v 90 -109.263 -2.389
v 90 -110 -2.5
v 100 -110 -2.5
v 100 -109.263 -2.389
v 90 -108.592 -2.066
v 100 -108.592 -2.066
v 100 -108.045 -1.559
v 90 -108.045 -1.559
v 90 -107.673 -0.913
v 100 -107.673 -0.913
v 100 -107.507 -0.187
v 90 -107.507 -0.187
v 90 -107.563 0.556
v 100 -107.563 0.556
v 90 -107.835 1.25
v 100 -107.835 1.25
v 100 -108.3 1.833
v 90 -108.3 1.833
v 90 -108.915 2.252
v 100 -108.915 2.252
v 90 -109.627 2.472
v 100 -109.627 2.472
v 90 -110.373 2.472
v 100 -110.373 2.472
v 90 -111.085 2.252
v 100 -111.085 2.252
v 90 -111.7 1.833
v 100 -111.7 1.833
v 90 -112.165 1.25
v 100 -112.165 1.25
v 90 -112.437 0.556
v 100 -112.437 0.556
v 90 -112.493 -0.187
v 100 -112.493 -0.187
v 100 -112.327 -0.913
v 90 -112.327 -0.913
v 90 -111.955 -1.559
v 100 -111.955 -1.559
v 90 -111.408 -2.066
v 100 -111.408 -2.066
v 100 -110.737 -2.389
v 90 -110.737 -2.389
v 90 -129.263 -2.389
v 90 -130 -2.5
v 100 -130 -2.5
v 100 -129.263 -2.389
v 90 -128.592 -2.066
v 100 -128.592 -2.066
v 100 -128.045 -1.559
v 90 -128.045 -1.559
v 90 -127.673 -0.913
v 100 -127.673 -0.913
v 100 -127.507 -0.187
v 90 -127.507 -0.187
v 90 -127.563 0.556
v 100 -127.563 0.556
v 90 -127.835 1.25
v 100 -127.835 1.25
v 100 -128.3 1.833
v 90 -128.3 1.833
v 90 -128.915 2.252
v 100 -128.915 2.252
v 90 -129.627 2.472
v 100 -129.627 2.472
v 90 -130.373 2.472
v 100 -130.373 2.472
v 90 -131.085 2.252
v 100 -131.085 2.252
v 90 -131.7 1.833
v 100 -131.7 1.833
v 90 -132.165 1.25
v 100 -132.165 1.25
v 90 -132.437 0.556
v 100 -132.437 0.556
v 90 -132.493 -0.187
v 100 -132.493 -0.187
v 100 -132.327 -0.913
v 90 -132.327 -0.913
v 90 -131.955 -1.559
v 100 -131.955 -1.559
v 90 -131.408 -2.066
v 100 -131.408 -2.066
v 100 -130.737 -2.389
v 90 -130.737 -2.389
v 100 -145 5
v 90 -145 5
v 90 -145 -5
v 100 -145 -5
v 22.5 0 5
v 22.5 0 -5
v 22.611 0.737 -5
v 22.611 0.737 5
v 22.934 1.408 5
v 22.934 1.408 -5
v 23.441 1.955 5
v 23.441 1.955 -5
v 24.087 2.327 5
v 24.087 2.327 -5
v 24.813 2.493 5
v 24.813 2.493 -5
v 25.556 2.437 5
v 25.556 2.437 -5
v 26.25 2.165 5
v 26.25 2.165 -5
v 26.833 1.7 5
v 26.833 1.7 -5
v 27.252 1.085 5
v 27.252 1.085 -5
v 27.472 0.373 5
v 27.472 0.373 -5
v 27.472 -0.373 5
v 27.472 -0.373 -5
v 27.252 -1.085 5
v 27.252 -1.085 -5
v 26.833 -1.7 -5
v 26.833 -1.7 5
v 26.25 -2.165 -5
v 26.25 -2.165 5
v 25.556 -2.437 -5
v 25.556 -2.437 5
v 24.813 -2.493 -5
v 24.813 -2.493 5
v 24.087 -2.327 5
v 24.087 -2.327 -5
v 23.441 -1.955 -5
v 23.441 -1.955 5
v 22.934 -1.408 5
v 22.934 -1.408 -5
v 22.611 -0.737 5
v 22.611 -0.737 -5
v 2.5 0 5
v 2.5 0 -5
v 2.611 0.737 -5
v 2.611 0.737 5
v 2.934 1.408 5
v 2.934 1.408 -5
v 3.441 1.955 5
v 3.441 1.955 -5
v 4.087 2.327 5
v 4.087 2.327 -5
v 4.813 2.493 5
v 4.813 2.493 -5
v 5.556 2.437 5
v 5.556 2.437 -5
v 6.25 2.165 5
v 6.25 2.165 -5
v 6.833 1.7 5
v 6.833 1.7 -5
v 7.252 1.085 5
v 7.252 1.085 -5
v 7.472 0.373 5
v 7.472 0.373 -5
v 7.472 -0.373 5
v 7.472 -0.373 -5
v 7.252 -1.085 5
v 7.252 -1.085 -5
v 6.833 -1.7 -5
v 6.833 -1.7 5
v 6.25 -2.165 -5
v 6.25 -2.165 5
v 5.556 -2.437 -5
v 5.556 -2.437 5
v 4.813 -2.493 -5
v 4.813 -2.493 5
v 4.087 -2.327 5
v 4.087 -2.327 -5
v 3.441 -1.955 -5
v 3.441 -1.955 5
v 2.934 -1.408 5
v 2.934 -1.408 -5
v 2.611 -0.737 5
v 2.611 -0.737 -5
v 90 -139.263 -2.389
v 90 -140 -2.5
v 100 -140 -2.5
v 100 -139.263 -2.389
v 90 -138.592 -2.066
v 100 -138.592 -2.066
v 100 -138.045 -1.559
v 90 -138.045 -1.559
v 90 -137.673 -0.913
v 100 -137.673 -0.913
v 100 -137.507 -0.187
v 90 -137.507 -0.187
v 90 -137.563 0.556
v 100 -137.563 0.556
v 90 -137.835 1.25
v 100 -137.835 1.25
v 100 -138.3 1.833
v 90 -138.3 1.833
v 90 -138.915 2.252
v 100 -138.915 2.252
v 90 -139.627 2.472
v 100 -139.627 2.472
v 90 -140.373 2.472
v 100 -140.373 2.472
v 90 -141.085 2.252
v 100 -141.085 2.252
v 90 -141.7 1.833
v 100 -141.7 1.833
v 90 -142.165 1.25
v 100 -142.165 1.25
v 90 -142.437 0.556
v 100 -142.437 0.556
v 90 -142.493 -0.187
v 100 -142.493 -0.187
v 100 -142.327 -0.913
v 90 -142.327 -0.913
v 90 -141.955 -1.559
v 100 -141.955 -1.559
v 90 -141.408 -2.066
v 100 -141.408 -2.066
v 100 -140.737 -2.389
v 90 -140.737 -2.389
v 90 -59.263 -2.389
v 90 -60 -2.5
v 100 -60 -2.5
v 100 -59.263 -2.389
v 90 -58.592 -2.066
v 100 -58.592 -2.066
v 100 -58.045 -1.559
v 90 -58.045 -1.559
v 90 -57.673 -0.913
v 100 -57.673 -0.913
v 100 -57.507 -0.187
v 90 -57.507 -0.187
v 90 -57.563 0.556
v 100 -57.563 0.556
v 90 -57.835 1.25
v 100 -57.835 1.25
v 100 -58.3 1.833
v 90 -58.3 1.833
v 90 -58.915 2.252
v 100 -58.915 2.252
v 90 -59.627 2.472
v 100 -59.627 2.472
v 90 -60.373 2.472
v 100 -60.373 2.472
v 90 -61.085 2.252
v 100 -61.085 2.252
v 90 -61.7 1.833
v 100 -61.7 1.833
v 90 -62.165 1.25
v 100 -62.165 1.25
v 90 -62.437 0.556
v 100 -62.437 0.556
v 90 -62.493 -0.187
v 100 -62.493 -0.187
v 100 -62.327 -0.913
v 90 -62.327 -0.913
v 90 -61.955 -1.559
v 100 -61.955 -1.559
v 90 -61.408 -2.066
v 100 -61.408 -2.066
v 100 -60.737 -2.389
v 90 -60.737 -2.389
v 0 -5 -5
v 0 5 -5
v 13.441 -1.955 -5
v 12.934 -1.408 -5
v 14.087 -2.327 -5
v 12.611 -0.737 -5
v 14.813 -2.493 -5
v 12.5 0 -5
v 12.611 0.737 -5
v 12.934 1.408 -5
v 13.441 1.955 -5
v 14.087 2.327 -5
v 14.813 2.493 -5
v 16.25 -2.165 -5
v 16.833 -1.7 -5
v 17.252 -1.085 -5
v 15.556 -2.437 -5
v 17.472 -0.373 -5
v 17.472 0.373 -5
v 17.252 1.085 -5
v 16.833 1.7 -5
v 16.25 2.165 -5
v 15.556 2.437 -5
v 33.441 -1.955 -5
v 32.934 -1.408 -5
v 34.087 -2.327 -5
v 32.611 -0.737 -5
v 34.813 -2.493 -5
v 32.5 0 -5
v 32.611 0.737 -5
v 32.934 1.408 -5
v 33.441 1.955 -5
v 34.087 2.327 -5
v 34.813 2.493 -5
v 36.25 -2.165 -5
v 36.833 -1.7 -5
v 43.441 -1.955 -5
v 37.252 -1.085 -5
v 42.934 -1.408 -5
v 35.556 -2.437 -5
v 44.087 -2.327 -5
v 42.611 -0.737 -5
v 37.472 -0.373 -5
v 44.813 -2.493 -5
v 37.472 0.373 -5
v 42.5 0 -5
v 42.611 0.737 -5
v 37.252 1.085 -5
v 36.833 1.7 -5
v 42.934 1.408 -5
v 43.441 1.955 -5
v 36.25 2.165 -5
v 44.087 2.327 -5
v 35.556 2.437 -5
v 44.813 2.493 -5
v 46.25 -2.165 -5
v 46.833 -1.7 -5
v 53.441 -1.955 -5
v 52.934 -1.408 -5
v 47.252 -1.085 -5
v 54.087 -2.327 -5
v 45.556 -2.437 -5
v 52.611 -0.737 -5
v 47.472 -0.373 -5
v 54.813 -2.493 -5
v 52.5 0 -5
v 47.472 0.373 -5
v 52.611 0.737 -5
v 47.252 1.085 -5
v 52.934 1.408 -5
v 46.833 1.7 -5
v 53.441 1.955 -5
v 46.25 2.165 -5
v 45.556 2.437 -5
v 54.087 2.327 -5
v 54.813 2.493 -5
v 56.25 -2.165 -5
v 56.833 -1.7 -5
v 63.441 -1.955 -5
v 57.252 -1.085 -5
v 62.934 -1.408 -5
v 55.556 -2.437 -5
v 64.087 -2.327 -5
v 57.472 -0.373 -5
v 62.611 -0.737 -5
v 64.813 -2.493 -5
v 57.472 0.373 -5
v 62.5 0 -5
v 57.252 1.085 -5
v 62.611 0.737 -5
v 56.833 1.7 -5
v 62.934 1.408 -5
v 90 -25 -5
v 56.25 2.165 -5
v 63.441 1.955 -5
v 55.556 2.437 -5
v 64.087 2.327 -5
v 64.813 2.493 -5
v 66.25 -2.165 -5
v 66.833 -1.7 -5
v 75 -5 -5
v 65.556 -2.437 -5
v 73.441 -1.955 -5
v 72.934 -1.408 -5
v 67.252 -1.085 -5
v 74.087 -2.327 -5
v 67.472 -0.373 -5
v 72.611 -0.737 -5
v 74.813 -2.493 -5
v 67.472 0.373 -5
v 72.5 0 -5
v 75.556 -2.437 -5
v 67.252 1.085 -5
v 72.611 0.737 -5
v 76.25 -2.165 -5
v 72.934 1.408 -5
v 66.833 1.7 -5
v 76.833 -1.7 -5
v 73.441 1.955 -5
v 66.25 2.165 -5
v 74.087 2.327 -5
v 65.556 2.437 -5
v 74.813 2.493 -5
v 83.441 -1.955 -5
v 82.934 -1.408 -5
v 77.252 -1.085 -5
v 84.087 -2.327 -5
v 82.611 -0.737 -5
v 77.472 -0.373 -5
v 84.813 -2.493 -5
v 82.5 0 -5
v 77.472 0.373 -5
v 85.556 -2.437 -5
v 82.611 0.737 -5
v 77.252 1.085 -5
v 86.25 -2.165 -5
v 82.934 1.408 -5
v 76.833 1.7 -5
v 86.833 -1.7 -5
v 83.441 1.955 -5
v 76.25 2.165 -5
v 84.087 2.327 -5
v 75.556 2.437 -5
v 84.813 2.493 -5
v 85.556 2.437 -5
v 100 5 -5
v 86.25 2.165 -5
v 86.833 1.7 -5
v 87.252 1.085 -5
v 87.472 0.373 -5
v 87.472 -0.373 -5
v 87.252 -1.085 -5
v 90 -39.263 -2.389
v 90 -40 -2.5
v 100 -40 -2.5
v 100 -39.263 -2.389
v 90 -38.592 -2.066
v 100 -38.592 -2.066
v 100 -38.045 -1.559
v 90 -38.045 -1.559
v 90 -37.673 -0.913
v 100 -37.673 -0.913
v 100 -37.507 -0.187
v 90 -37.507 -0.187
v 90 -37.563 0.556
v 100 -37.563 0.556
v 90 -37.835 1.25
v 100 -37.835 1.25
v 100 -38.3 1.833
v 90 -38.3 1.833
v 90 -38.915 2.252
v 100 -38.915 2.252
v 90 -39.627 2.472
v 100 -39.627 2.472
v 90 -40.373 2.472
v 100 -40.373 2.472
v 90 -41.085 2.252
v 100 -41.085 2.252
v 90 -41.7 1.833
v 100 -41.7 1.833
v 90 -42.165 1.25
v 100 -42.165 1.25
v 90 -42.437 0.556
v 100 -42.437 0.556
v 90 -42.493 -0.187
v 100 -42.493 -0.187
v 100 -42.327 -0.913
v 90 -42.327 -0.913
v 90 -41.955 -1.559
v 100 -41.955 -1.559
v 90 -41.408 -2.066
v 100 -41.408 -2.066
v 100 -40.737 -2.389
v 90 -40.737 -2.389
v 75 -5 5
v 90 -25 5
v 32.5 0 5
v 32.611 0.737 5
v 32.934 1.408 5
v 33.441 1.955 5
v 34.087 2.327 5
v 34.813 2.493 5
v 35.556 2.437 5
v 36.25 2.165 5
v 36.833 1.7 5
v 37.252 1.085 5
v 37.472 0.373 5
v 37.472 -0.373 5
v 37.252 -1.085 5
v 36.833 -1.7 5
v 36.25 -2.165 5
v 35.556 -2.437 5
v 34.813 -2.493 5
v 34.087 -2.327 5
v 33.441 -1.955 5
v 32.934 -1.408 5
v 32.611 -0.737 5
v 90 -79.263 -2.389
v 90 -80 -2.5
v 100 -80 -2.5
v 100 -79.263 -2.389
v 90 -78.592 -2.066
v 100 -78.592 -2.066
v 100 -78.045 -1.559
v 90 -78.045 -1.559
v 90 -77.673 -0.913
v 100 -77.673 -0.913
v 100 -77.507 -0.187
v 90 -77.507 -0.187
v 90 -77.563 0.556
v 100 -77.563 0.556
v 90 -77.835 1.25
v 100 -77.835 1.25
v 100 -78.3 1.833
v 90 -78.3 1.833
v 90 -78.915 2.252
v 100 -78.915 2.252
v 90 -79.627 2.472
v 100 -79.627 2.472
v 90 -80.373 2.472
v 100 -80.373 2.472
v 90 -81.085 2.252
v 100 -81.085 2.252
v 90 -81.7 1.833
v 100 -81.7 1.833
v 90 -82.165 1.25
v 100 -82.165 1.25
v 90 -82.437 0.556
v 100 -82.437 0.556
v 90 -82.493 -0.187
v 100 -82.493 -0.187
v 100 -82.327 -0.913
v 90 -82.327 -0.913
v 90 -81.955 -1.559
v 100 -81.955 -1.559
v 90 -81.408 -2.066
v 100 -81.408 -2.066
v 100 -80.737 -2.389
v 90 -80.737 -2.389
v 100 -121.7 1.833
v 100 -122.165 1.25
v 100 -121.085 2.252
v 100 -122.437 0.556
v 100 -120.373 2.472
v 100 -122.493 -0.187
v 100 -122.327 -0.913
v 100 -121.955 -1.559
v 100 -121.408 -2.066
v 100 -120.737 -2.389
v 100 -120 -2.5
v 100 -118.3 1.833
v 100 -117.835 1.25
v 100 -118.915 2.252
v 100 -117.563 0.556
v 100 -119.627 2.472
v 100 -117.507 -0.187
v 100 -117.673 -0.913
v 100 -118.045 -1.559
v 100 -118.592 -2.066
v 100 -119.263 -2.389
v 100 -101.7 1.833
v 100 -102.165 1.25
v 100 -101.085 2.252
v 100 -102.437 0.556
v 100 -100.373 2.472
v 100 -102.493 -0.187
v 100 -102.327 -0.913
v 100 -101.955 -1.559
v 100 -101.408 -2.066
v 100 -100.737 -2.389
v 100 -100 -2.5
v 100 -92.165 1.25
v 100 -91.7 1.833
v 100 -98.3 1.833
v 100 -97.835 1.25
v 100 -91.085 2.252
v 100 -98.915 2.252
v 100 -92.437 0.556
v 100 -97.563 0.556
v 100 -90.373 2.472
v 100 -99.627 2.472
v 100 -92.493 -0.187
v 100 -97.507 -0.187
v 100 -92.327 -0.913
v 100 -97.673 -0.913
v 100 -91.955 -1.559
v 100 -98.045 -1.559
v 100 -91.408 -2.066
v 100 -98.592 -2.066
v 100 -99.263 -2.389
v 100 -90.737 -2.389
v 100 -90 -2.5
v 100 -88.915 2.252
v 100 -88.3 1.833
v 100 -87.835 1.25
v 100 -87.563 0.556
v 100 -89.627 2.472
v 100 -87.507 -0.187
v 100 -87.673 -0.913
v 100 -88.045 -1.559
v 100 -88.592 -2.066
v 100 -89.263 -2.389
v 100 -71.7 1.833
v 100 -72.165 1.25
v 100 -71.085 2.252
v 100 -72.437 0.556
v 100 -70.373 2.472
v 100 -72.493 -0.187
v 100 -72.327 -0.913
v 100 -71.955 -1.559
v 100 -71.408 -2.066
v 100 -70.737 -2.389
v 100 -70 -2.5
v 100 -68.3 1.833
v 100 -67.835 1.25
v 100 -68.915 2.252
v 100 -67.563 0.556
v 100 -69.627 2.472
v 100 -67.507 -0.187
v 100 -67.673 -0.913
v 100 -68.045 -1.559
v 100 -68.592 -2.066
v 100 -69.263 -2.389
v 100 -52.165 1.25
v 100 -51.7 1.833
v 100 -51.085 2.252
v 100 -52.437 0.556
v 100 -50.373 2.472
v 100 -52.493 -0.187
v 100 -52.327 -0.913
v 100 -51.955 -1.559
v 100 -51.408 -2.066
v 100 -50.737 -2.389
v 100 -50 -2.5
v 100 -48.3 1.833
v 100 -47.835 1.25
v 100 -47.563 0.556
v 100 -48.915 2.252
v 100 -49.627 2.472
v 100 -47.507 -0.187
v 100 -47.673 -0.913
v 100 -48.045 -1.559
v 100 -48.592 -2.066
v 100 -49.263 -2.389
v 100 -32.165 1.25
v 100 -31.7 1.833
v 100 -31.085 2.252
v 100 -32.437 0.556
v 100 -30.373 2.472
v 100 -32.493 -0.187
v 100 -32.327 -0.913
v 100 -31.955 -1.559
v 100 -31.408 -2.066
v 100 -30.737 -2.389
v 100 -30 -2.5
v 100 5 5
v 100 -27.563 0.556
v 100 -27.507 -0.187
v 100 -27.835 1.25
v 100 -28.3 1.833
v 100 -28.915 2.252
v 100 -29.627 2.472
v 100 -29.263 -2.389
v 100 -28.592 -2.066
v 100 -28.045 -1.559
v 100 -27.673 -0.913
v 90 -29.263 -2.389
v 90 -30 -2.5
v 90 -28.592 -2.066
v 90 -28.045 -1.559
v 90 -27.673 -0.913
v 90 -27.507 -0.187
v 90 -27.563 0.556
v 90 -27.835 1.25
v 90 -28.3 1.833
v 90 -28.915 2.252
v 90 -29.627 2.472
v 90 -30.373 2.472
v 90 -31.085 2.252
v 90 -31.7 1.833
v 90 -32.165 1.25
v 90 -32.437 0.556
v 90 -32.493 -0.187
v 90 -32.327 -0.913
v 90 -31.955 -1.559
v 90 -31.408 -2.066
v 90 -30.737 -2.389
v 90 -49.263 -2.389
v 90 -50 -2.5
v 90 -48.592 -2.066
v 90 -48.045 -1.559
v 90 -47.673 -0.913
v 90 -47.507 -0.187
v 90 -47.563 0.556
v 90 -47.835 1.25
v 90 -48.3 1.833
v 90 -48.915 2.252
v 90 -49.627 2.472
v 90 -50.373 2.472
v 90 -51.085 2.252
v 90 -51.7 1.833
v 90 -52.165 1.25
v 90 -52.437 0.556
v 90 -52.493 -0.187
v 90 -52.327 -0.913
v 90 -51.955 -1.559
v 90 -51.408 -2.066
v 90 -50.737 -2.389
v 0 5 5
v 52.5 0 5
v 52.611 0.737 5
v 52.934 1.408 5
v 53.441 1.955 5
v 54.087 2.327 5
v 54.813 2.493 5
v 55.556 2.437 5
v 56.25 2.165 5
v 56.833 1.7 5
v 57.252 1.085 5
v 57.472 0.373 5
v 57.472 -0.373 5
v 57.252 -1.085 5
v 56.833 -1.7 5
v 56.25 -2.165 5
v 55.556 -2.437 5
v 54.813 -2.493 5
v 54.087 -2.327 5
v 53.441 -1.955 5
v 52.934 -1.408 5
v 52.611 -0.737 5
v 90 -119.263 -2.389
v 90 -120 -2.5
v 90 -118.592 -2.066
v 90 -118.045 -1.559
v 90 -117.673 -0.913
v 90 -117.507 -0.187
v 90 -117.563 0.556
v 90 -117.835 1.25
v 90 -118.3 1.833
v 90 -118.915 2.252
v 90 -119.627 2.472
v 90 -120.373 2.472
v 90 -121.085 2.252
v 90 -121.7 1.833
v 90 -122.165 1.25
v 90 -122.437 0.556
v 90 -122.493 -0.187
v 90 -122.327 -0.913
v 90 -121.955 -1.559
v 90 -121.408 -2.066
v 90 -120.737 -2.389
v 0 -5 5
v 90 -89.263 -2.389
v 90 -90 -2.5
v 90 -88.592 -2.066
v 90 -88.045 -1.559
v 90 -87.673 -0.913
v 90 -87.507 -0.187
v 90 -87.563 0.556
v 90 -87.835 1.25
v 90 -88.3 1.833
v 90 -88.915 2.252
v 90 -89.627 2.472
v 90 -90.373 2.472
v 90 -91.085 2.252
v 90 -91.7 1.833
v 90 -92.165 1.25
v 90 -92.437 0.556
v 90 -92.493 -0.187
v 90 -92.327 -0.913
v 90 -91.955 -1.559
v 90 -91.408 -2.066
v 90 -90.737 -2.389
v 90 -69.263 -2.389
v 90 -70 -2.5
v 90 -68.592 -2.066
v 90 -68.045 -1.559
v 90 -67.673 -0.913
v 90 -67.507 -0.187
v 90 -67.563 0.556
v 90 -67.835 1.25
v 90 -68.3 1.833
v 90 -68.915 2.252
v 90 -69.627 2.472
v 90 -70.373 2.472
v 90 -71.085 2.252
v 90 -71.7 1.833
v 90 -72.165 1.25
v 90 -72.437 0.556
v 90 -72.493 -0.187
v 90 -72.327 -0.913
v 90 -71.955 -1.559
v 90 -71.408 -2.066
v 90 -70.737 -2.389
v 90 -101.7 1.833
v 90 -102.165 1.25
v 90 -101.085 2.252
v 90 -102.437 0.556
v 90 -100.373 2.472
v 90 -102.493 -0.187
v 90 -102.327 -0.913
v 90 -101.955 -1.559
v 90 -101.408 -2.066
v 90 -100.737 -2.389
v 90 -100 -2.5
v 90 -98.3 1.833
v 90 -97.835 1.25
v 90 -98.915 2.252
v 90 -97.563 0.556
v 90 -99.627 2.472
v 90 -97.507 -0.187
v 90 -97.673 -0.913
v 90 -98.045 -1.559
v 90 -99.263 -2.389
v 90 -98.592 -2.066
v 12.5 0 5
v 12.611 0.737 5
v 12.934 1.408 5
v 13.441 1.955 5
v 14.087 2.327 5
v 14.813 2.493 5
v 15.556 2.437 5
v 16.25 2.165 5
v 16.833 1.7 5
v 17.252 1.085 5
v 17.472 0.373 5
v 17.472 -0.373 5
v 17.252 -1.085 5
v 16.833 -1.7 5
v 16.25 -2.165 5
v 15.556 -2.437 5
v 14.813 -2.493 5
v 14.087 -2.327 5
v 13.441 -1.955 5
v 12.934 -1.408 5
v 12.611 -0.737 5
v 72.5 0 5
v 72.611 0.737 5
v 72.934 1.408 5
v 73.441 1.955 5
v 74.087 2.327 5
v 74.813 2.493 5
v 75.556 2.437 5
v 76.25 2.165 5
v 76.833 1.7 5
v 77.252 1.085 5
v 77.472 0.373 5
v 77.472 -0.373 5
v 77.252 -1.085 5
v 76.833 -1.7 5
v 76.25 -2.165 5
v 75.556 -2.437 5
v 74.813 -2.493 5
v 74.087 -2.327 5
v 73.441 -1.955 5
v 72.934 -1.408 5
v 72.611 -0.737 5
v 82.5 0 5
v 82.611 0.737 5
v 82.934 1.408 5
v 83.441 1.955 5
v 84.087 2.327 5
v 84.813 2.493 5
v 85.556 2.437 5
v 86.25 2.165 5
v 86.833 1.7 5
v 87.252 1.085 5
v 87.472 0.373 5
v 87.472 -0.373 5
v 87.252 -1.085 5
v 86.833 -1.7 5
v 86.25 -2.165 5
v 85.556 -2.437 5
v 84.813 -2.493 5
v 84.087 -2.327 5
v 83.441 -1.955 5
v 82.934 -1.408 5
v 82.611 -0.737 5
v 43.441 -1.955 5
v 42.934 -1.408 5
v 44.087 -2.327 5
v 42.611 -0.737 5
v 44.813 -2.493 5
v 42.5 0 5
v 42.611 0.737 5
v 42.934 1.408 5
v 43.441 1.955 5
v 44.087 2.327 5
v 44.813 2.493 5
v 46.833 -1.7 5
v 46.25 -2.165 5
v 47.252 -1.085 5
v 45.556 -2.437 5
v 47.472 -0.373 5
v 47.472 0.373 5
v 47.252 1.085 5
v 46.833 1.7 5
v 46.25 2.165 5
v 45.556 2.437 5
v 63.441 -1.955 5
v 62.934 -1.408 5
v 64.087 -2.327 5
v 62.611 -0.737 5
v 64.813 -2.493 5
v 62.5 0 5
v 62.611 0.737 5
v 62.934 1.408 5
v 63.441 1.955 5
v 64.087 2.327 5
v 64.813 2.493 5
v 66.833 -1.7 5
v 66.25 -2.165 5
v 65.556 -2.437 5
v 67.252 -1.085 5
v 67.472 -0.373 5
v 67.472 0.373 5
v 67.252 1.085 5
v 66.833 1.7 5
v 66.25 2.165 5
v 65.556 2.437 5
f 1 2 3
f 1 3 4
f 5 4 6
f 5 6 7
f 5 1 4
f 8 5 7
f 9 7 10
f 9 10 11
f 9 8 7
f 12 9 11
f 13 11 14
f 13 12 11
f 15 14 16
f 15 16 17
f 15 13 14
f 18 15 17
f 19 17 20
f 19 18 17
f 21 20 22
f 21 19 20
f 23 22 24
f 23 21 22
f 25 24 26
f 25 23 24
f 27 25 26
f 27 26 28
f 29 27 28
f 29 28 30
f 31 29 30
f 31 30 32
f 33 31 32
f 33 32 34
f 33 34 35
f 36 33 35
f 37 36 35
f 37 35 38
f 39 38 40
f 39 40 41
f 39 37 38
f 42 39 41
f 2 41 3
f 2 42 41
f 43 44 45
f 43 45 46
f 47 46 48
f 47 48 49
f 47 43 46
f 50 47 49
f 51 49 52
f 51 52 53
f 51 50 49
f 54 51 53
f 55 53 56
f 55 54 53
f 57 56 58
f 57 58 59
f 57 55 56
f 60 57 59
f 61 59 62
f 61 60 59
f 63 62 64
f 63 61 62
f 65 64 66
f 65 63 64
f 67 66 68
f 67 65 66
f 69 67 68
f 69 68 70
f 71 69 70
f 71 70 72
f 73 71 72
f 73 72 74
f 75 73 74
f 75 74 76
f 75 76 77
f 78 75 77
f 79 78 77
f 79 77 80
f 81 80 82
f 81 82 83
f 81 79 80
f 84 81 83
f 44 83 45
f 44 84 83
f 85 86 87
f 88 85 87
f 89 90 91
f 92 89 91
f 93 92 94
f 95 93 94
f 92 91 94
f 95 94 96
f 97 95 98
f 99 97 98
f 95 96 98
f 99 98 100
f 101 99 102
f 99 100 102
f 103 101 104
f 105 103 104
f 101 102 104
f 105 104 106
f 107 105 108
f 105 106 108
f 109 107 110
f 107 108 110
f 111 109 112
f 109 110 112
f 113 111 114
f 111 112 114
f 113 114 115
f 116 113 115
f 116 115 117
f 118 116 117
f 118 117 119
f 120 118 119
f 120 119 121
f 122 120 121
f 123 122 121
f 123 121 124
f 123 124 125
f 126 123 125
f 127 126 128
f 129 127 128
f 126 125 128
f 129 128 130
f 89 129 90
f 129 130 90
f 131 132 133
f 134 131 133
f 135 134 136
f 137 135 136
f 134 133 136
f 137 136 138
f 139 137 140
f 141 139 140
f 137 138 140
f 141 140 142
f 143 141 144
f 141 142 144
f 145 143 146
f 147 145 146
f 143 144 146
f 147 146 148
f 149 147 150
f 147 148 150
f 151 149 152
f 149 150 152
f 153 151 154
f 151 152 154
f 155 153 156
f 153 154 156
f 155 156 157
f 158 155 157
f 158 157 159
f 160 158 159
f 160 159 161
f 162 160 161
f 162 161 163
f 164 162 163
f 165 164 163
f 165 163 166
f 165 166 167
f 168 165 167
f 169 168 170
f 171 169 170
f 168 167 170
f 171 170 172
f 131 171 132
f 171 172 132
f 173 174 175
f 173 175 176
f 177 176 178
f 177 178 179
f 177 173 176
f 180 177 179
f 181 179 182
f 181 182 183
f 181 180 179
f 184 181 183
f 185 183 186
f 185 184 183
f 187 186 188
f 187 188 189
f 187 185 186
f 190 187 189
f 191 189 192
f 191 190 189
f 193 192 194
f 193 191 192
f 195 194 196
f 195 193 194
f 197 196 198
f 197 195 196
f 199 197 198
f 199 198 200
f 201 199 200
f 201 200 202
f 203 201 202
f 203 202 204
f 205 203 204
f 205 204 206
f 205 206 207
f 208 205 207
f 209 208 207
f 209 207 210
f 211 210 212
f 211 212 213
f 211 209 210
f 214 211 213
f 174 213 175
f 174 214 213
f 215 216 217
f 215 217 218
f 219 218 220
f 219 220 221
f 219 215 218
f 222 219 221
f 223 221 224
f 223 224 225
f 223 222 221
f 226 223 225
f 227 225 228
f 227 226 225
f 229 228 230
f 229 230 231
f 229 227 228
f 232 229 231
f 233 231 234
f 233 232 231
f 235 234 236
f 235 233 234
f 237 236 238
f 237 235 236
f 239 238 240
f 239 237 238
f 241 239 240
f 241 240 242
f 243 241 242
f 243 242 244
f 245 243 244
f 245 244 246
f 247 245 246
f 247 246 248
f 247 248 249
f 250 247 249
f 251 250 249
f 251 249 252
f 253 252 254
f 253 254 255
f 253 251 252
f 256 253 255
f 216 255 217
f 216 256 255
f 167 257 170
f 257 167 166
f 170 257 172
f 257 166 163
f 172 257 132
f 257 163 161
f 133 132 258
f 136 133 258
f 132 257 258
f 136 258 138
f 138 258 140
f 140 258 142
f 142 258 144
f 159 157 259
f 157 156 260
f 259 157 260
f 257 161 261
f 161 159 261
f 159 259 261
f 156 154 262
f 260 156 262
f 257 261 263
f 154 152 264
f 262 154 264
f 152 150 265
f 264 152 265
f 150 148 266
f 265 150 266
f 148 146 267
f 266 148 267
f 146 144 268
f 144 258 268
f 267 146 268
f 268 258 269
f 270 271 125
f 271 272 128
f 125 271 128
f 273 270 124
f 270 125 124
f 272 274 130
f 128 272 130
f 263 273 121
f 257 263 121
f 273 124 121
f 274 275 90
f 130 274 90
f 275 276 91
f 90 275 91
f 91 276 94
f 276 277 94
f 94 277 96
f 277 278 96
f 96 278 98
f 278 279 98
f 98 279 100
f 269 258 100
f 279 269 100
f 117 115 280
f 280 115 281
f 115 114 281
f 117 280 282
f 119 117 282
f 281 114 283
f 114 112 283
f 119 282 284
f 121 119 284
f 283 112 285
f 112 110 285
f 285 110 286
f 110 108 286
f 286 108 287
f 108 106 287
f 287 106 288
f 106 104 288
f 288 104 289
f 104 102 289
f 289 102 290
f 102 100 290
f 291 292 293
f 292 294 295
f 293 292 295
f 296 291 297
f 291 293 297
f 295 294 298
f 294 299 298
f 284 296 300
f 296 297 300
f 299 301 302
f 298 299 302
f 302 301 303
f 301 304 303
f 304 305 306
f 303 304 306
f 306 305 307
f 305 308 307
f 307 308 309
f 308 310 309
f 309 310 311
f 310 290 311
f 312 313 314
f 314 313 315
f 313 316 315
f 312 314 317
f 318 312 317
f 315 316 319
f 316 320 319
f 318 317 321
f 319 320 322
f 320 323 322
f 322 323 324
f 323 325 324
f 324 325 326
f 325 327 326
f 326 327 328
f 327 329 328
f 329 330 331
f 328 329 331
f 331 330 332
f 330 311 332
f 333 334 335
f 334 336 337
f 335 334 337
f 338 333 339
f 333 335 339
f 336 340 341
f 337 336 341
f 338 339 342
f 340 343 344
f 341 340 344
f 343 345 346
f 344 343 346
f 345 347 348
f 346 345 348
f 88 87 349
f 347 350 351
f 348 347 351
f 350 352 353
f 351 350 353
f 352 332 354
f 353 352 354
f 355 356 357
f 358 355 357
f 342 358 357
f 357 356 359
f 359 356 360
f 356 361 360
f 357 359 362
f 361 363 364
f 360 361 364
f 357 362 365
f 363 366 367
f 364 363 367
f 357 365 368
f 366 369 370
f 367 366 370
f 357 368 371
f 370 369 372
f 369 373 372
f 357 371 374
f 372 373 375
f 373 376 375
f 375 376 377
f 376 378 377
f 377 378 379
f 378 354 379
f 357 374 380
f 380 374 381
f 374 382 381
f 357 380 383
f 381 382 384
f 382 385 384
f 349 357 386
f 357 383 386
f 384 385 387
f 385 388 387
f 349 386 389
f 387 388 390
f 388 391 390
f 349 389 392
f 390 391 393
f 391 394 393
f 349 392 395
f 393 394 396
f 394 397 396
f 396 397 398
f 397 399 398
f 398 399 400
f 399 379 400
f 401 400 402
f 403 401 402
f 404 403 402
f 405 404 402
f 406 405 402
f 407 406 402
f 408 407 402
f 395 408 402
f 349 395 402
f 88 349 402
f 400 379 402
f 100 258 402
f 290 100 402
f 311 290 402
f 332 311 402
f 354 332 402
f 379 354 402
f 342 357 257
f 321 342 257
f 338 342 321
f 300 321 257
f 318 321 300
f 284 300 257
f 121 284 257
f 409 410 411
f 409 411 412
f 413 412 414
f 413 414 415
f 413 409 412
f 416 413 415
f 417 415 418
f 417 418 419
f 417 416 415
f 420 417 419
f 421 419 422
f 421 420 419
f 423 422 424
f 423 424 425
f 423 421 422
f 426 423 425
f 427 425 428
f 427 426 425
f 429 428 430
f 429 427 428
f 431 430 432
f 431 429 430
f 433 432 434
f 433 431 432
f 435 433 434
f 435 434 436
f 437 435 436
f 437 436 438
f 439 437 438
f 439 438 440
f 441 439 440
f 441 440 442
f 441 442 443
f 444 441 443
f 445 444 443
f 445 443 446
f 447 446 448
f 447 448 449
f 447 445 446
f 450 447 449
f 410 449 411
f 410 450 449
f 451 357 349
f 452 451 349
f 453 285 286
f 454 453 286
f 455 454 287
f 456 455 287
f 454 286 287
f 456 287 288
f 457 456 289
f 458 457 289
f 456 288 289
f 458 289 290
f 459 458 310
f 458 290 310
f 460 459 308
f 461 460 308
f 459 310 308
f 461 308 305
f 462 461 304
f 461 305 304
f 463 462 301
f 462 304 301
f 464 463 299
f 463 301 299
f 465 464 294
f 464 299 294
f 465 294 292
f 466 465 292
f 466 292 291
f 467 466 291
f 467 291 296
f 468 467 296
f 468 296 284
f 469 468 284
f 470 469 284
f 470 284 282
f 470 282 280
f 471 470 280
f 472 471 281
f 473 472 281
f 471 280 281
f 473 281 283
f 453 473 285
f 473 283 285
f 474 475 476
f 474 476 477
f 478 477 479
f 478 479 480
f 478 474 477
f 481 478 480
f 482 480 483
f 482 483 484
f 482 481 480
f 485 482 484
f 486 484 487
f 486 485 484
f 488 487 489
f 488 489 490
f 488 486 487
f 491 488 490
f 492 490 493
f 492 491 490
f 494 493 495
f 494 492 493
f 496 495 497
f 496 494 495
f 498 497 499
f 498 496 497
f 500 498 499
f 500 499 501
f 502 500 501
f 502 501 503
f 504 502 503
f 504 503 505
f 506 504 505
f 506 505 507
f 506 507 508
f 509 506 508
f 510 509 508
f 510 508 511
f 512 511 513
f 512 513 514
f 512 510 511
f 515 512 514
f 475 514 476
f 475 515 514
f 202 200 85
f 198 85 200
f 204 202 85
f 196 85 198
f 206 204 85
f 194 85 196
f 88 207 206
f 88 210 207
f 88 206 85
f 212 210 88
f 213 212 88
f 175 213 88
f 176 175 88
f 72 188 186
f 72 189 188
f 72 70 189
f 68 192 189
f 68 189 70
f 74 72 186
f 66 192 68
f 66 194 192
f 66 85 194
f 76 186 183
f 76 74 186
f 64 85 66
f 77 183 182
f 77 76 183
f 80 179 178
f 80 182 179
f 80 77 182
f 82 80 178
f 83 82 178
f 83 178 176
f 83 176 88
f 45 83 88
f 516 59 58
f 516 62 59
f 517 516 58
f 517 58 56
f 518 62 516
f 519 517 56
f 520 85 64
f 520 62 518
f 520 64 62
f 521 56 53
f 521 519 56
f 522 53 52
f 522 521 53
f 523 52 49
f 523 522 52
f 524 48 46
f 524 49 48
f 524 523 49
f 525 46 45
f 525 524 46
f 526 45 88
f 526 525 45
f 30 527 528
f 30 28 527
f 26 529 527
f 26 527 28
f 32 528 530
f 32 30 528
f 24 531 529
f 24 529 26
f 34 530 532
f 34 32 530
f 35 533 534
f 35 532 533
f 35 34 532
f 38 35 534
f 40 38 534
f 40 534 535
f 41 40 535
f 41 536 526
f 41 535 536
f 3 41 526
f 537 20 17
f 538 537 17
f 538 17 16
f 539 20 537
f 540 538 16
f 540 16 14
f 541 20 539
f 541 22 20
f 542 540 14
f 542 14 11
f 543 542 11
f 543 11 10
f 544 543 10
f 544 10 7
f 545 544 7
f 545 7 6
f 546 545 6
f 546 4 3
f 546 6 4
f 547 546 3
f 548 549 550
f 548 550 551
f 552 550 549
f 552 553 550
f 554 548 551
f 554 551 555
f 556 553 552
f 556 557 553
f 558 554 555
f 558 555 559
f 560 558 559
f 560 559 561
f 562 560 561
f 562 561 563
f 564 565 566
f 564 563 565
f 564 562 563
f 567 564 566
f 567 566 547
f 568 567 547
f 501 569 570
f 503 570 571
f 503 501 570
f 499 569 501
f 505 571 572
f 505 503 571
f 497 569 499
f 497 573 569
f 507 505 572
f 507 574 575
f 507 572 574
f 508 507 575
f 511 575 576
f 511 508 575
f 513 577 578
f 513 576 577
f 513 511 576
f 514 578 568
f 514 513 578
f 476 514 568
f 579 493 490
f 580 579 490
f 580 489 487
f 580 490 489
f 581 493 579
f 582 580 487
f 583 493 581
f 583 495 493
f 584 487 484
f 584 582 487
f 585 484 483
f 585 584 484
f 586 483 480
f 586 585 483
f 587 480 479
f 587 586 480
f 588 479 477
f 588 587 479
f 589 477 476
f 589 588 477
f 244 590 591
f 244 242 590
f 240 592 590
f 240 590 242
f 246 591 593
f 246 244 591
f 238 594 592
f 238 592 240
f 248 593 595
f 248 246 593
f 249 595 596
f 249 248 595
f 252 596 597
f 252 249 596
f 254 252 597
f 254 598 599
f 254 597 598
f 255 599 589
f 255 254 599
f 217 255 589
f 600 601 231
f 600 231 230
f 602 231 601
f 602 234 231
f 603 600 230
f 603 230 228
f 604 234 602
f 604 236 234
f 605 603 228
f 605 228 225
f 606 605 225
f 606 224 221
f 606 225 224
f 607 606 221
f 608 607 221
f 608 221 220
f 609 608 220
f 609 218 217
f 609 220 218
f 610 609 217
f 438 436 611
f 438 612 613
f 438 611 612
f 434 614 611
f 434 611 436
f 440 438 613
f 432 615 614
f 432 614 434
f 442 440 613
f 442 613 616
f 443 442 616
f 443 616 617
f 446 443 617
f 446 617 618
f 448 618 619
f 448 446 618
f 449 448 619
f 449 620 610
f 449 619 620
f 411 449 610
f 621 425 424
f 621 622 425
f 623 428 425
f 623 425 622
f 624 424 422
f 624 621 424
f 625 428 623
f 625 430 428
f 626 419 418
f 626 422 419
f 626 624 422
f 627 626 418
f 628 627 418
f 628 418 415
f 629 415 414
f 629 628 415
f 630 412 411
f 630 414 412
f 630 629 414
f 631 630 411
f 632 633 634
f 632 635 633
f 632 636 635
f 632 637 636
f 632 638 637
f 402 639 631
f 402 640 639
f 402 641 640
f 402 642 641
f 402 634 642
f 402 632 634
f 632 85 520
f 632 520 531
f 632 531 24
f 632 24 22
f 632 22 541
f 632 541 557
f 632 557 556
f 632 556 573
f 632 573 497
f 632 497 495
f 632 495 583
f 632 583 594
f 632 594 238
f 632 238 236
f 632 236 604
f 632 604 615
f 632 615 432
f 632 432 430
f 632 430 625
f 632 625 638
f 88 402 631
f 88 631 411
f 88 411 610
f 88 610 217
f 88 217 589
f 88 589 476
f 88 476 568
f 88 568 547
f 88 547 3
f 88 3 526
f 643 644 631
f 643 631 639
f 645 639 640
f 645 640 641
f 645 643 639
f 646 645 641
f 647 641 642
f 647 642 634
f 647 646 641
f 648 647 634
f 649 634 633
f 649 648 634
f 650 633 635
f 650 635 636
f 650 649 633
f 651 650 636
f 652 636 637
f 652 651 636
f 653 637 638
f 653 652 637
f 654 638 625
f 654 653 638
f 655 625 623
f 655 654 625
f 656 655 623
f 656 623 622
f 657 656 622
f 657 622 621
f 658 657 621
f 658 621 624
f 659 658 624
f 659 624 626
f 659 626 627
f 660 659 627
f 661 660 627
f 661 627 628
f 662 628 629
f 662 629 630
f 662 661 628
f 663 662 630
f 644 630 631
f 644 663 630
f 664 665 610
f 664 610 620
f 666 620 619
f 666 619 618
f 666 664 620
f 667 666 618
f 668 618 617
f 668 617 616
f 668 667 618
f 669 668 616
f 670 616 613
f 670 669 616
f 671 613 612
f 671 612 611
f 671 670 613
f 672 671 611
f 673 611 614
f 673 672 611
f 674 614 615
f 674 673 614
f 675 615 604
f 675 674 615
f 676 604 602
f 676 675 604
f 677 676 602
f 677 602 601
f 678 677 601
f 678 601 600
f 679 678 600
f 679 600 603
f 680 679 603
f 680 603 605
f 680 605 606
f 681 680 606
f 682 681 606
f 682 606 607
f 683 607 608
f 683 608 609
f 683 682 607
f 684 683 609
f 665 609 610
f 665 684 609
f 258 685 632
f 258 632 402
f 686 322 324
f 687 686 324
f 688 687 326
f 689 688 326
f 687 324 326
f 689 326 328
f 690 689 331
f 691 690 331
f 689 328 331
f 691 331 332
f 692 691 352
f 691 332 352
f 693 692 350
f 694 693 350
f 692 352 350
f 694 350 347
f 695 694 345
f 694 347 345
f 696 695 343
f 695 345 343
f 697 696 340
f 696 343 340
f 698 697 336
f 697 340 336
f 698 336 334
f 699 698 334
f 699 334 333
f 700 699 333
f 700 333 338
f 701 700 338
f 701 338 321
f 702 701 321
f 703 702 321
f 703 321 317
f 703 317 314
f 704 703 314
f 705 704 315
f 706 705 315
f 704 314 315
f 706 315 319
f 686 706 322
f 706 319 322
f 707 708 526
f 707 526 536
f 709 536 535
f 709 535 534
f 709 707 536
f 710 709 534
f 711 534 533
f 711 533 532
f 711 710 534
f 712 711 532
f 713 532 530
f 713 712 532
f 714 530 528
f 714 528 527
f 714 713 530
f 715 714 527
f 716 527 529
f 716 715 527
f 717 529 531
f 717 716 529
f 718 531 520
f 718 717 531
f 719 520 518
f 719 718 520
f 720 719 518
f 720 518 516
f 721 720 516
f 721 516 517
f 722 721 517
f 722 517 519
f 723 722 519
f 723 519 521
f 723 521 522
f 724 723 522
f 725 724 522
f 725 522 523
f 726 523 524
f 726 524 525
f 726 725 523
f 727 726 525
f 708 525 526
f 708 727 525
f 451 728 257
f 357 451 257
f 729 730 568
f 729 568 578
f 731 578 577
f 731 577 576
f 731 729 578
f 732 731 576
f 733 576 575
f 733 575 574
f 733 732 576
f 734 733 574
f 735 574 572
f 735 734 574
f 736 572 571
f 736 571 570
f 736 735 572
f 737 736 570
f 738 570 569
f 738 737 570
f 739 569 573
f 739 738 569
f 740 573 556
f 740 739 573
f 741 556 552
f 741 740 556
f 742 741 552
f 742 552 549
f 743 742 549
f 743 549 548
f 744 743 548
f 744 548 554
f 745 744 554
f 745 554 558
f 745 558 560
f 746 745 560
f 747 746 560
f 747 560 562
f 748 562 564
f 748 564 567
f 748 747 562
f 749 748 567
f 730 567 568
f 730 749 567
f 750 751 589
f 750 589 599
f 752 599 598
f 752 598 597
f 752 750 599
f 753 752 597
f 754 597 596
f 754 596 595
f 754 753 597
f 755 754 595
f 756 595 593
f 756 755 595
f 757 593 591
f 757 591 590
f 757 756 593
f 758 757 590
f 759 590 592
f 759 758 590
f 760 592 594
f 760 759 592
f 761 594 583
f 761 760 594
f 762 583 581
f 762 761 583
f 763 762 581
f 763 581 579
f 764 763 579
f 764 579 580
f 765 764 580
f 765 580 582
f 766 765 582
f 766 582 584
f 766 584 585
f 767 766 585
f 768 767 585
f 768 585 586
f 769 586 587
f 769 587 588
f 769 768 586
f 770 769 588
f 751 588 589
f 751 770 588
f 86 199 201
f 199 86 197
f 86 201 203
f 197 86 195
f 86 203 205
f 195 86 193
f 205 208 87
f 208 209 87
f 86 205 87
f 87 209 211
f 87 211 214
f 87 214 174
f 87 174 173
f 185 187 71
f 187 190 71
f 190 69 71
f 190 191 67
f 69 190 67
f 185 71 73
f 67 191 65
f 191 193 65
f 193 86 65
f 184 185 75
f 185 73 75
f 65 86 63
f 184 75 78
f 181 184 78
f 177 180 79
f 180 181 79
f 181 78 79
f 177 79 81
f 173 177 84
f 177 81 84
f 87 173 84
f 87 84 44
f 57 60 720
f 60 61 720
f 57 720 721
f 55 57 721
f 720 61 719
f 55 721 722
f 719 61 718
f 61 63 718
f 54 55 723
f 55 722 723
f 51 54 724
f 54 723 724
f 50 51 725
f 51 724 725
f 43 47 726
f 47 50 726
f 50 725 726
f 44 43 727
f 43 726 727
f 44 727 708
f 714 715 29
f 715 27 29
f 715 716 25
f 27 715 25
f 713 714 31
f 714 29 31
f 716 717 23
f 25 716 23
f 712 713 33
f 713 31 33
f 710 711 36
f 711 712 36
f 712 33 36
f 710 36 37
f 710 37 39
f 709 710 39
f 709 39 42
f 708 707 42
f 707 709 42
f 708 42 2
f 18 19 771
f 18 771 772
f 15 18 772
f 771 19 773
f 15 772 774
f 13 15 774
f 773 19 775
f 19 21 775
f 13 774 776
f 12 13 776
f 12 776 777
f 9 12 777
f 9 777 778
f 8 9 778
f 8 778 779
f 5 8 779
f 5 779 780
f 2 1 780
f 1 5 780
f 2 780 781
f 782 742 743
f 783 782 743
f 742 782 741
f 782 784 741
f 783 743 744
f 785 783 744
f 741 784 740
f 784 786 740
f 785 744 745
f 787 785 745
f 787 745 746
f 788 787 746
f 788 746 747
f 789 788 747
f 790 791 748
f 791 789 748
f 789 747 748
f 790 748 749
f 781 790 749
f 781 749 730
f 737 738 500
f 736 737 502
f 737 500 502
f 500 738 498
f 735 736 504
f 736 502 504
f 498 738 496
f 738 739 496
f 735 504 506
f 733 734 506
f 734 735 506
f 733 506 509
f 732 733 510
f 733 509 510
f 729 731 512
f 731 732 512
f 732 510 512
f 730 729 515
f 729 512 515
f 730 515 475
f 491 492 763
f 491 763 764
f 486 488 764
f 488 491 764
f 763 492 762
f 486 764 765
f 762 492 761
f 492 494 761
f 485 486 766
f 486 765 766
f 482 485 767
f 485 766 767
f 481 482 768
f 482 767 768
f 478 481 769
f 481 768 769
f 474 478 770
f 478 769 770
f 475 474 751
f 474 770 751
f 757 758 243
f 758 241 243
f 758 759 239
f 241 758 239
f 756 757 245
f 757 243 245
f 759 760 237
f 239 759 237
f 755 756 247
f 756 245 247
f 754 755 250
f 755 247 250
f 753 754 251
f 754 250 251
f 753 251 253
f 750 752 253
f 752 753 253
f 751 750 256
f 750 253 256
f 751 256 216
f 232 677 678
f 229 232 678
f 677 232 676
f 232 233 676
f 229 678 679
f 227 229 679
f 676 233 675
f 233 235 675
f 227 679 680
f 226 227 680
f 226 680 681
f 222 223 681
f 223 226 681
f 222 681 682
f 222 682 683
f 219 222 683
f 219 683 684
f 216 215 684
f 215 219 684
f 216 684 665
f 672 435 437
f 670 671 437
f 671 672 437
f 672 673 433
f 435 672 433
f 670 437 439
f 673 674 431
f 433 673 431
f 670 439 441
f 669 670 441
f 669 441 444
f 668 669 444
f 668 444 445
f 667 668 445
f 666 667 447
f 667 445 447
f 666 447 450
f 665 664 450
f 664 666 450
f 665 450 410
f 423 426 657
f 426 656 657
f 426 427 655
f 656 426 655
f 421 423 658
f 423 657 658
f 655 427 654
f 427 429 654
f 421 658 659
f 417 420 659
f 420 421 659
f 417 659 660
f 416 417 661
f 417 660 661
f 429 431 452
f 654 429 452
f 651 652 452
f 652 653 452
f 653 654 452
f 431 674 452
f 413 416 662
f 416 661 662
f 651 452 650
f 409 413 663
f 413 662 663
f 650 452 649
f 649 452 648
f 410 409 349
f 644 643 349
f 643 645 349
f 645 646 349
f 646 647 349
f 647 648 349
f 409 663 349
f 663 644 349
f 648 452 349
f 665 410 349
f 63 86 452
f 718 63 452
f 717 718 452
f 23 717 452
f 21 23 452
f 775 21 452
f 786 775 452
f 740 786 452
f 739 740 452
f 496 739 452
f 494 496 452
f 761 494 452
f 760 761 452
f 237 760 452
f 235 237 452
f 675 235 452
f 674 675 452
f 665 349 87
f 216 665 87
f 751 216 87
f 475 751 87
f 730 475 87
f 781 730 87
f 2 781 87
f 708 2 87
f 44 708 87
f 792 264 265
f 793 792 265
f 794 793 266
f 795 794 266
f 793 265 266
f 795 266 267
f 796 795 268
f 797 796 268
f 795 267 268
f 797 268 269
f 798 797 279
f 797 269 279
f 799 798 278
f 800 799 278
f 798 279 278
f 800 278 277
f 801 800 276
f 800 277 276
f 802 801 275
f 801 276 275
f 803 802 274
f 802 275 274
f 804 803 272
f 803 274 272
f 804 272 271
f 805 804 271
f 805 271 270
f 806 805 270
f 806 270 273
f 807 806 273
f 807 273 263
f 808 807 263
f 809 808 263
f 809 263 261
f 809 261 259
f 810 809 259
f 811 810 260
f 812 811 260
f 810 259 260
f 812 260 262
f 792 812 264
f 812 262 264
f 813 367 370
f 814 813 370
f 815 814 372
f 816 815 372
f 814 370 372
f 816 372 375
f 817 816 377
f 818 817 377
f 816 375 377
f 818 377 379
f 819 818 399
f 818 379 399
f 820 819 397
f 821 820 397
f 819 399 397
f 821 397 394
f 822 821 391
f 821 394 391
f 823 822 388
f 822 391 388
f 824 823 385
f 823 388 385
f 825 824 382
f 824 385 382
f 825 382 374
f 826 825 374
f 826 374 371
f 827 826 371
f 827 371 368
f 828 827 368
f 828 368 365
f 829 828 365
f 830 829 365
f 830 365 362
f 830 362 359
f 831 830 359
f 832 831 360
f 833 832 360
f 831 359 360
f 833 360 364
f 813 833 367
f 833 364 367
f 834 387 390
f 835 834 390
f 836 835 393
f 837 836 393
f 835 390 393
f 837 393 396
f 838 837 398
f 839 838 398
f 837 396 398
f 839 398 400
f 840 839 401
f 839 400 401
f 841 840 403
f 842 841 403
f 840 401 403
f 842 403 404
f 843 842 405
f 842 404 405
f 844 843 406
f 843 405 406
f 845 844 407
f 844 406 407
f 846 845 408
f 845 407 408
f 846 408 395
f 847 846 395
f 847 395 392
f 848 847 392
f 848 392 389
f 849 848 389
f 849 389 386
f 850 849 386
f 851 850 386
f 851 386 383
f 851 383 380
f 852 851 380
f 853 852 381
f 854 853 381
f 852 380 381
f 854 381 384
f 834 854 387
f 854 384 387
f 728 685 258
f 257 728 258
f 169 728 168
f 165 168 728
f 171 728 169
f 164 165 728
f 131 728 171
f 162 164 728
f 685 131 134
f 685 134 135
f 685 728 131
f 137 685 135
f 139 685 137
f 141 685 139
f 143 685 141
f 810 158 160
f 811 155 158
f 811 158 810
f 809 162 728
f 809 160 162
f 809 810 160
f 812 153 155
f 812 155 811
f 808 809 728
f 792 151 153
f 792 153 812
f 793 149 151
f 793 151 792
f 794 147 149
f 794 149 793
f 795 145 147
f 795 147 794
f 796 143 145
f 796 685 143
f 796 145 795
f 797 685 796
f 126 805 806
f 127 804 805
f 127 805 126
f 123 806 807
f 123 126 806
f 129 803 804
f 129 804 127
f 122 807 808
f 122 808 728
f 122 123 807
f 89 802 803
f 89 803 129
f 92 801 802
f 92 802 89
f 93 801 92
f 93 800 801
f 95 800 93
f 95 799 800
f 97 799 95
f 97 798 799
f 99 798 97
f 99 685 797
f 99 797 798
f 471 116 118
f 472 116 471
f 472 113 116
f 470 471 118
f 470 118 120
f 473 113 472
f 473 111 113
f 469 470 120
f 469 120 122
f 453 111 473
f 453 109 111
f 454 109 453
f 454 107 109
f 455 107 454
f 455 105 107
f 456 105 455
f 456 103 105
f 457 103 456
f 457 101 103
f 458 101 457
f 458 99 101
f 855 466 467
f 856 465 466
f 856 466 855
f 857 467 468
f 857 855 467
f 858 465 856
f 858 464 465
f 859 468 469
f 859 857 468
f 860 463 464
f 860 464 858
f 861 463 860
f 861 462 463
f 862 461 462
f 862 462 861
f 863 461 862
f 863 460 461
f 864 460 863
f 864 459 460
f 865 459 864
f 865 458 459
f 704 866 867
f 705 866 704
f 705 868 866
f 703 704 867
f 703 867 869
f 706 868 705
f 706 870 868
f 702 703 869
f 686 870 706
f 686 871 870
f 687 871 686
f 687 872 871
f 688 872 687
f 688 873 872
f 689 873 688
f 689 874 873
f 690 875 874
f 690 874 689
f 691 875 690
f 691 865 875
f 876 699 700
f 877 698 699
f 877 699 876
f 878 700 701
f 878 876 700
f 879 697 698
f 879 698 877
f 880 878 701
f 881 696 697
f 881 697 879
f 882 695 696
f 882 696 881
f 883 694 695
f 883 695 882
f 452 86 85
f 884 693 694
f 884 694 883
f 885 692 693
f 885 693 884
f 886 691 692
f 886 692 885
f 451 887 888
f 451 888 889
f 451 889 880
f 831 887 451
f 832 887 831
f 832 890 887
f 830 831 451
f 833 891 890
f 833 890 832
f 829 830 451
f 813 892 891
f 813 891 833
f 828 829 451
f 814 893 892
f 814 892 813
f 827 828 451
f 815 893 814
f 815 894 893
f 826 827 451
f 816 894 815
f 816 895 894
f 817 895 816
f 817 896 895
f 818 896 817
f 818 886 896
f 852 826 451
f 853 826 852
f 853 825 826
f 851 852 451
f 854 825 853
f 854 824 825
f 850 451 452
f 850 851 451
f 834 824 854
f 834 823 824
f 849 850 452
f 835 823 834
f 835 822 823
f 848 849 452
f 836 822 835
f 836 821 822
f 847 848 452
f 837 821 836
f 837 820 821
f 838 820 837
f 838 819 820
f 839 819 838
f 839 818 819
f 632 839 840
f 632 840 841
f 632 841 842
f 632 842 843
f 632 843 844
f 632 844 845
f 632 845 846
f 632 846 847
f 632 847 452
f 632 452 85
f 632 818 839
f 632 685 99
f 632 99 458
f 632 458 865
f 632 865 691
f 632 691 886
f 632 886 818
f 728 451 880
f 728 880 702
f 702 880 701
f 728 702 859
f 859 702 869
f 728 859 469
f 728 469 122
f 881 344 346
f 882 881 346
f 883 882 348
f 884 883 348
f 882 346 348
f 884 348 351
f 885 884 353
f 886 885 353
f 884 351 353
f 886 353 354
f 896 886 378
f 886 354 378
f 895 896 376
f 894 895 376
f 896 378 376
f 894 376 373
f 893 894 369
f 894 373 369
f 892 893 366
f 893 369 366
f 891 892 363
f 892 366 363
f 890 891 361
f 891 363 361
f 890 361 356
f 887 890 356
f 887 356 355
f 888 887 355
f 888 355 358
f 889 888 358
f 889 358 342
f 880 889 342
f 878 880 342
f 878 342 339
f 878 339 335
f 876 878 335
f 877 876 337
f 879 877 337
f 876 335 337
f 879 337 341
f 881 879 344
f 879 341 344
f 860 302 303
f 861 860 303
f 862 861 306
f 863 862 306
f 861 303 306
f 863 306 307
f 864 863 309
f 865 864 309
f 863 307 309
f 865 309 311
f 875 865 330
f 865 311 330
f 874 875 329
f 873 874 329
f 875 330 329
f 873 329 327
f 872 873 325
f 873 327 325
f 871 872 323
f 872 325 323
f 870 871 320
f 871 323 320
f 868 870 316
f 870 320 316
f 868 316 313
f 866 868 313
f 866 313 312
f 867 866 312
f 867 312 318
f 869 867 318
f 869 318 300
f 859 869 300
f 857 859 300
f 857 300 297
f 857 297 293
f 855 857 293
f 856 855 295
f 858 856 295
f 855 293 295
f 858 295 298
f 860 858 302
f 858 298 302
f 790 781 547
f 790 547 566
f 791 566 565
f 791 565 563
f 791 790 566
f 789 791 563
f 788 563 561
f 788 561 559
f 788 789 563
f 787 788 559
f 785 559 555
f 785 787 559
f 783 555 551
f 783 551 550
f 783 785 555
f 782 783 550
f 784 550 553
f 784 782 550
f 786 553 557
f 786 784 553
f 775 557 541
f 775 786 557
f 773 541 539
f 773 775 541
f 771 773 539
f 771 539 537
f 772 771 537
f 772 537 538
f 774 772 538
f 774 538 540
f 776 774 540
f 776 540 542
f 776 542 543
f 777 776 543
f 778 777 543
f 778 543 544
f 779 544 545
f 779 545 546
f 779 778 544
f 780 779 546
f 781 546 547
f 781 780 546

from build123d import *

# Parameters (mm, degrees)
ESQUISSE2_W             = 10
ESQUISSE2_H             = 10
BOSS_EXTRU_1_DEPTH      = 90
ESQUISSE3_W             = 10
ESQUISSE3_H             = 150
ESQUISSE3_R             = 2.5
BOSS_EXTRU_2_DEPTH      = 10
ESQUISSE4_R             = 2.5
ENL_V_MAT_EXTRU_1_DEPTH = 10
BOSS_EXTRU_3_DEPTH      = 10


with BuildPart() as part:
    # Esquisse2 → Boss.-Extru.1 (new body)
    with BuildSketch(Plane(origin=(0, 0, 0), x_dir=(0, 0, -1), z_dir=(1, 0, 0))):
        Rectangle(ESQUISSE2_W, ESQUISSE2_H)
    extrude(amount=BOSS_EXTRU_1_DEPTH)

    # Esquisse3 → Boss.-Extru.2 (add)
    with BuildSketch(Plane(origin=(90, 0, 0), x_dir=(0, 0, -1), z_dir=(1, 0, 0))):
        with Locations((0, -70)):
            Rectangle(ESQUISSE3_W, ESQUISSE3_H)
        with Locations((0, -140)):
            Circle(ESQUISSE3_R, mode=Mode.SUBTRACT)
        with Locations((0, -130)):
            Circle(ESQUISSE3_R, mode=Mode.SUBTRACT)
        with Locations((0, -120)):
            Circle(ESQUISSE3_R, mode=Mode.SUBTRACT)
        with Locations((0, -110)):
            Circle(ESQUISSE3_R, mode=Mode.SUBTRACT)
        with Locations((0, -100)):
            Circle(ESQUISSE3_R, mode=Mode.SUBTRACT)
        with Locations((0, -90)):
            Circle(ESQUISSE3_R, mode=Mode.SUBTRACT)
        with Locations((0, -80)):
            Circle(ESQUISSE3_R, mode=Mode.SUBTRACT)
        with Locations((0, -70)):
            Circle(ESQUISSE3_R, mode=Mode.SUBTRACT)
        with Locations((0, -60)):
            Circle(ESQUISSE3_R, mode=Mode.SUBTRACT)
        with Locations((0, -50)):
            Circle(ESQUISSE3_R, mode=Mode.SUBTRACT)
        with Locations((0, -40)):
            Circle(ESQUISSE3_R, mode=Mode.SUBTRACT)
        with Locations((0, -30)):
            Circle(ESQUISSE3_R, mode=Mode.SUBTRACT)
    extrude(amount=BOSS_EXTRU_2_DEPTH)

    # Esquisse4 → Enlèv. mat.-Extru.1 (cut)
    with BuildSketch(Plane(origin=(0, 0, -5), x_dir=(-1, 0, 0), z_dir=(0, 0, -1))):
        with Locations((-5, 0)):
            Circle(ESQUISSE4_R)
        with Locations((-15, 0)):
            Circle(ESQUISSE4_R)
        with Locations((-25, 0)):
            Circle(ESQUISSE4_R)
        with Locations((-35, 0)):
            Circle(ESQUISSE4_R)
        with Locations((-45, 0)):
            Circle(ESQUISSE4_R)
        with Locations((-55, 0)):
            Circle(ESQUISSE4_R)
        with Locations((-65, 0)):
            Circle(ESQUISSE4_R)
        with Locations((-75, 0)):
            Circle(ESQUISSE4_R)
        with Locations((-85, 0)):
            Circle(ESQUISSE4_R)
    extrude(amount=-ENL_V_MAT_EXTRU_1_DEPTH, mode=Mode.SUBTRACT)

    # Esquisse5 → Boss.-Extru.3 (add)
    with BuildSketch(Plane(origin=(0, 0, -5), x_dir=(-1, 0, 0), z_dir=(0, 0, -1))):
        Polygon((-75, -5), (-90, -25), (-90, -5), align=None)
    extrude(amount=-BOSS_EXTRU_3_DEPTH)


solid = part.part
